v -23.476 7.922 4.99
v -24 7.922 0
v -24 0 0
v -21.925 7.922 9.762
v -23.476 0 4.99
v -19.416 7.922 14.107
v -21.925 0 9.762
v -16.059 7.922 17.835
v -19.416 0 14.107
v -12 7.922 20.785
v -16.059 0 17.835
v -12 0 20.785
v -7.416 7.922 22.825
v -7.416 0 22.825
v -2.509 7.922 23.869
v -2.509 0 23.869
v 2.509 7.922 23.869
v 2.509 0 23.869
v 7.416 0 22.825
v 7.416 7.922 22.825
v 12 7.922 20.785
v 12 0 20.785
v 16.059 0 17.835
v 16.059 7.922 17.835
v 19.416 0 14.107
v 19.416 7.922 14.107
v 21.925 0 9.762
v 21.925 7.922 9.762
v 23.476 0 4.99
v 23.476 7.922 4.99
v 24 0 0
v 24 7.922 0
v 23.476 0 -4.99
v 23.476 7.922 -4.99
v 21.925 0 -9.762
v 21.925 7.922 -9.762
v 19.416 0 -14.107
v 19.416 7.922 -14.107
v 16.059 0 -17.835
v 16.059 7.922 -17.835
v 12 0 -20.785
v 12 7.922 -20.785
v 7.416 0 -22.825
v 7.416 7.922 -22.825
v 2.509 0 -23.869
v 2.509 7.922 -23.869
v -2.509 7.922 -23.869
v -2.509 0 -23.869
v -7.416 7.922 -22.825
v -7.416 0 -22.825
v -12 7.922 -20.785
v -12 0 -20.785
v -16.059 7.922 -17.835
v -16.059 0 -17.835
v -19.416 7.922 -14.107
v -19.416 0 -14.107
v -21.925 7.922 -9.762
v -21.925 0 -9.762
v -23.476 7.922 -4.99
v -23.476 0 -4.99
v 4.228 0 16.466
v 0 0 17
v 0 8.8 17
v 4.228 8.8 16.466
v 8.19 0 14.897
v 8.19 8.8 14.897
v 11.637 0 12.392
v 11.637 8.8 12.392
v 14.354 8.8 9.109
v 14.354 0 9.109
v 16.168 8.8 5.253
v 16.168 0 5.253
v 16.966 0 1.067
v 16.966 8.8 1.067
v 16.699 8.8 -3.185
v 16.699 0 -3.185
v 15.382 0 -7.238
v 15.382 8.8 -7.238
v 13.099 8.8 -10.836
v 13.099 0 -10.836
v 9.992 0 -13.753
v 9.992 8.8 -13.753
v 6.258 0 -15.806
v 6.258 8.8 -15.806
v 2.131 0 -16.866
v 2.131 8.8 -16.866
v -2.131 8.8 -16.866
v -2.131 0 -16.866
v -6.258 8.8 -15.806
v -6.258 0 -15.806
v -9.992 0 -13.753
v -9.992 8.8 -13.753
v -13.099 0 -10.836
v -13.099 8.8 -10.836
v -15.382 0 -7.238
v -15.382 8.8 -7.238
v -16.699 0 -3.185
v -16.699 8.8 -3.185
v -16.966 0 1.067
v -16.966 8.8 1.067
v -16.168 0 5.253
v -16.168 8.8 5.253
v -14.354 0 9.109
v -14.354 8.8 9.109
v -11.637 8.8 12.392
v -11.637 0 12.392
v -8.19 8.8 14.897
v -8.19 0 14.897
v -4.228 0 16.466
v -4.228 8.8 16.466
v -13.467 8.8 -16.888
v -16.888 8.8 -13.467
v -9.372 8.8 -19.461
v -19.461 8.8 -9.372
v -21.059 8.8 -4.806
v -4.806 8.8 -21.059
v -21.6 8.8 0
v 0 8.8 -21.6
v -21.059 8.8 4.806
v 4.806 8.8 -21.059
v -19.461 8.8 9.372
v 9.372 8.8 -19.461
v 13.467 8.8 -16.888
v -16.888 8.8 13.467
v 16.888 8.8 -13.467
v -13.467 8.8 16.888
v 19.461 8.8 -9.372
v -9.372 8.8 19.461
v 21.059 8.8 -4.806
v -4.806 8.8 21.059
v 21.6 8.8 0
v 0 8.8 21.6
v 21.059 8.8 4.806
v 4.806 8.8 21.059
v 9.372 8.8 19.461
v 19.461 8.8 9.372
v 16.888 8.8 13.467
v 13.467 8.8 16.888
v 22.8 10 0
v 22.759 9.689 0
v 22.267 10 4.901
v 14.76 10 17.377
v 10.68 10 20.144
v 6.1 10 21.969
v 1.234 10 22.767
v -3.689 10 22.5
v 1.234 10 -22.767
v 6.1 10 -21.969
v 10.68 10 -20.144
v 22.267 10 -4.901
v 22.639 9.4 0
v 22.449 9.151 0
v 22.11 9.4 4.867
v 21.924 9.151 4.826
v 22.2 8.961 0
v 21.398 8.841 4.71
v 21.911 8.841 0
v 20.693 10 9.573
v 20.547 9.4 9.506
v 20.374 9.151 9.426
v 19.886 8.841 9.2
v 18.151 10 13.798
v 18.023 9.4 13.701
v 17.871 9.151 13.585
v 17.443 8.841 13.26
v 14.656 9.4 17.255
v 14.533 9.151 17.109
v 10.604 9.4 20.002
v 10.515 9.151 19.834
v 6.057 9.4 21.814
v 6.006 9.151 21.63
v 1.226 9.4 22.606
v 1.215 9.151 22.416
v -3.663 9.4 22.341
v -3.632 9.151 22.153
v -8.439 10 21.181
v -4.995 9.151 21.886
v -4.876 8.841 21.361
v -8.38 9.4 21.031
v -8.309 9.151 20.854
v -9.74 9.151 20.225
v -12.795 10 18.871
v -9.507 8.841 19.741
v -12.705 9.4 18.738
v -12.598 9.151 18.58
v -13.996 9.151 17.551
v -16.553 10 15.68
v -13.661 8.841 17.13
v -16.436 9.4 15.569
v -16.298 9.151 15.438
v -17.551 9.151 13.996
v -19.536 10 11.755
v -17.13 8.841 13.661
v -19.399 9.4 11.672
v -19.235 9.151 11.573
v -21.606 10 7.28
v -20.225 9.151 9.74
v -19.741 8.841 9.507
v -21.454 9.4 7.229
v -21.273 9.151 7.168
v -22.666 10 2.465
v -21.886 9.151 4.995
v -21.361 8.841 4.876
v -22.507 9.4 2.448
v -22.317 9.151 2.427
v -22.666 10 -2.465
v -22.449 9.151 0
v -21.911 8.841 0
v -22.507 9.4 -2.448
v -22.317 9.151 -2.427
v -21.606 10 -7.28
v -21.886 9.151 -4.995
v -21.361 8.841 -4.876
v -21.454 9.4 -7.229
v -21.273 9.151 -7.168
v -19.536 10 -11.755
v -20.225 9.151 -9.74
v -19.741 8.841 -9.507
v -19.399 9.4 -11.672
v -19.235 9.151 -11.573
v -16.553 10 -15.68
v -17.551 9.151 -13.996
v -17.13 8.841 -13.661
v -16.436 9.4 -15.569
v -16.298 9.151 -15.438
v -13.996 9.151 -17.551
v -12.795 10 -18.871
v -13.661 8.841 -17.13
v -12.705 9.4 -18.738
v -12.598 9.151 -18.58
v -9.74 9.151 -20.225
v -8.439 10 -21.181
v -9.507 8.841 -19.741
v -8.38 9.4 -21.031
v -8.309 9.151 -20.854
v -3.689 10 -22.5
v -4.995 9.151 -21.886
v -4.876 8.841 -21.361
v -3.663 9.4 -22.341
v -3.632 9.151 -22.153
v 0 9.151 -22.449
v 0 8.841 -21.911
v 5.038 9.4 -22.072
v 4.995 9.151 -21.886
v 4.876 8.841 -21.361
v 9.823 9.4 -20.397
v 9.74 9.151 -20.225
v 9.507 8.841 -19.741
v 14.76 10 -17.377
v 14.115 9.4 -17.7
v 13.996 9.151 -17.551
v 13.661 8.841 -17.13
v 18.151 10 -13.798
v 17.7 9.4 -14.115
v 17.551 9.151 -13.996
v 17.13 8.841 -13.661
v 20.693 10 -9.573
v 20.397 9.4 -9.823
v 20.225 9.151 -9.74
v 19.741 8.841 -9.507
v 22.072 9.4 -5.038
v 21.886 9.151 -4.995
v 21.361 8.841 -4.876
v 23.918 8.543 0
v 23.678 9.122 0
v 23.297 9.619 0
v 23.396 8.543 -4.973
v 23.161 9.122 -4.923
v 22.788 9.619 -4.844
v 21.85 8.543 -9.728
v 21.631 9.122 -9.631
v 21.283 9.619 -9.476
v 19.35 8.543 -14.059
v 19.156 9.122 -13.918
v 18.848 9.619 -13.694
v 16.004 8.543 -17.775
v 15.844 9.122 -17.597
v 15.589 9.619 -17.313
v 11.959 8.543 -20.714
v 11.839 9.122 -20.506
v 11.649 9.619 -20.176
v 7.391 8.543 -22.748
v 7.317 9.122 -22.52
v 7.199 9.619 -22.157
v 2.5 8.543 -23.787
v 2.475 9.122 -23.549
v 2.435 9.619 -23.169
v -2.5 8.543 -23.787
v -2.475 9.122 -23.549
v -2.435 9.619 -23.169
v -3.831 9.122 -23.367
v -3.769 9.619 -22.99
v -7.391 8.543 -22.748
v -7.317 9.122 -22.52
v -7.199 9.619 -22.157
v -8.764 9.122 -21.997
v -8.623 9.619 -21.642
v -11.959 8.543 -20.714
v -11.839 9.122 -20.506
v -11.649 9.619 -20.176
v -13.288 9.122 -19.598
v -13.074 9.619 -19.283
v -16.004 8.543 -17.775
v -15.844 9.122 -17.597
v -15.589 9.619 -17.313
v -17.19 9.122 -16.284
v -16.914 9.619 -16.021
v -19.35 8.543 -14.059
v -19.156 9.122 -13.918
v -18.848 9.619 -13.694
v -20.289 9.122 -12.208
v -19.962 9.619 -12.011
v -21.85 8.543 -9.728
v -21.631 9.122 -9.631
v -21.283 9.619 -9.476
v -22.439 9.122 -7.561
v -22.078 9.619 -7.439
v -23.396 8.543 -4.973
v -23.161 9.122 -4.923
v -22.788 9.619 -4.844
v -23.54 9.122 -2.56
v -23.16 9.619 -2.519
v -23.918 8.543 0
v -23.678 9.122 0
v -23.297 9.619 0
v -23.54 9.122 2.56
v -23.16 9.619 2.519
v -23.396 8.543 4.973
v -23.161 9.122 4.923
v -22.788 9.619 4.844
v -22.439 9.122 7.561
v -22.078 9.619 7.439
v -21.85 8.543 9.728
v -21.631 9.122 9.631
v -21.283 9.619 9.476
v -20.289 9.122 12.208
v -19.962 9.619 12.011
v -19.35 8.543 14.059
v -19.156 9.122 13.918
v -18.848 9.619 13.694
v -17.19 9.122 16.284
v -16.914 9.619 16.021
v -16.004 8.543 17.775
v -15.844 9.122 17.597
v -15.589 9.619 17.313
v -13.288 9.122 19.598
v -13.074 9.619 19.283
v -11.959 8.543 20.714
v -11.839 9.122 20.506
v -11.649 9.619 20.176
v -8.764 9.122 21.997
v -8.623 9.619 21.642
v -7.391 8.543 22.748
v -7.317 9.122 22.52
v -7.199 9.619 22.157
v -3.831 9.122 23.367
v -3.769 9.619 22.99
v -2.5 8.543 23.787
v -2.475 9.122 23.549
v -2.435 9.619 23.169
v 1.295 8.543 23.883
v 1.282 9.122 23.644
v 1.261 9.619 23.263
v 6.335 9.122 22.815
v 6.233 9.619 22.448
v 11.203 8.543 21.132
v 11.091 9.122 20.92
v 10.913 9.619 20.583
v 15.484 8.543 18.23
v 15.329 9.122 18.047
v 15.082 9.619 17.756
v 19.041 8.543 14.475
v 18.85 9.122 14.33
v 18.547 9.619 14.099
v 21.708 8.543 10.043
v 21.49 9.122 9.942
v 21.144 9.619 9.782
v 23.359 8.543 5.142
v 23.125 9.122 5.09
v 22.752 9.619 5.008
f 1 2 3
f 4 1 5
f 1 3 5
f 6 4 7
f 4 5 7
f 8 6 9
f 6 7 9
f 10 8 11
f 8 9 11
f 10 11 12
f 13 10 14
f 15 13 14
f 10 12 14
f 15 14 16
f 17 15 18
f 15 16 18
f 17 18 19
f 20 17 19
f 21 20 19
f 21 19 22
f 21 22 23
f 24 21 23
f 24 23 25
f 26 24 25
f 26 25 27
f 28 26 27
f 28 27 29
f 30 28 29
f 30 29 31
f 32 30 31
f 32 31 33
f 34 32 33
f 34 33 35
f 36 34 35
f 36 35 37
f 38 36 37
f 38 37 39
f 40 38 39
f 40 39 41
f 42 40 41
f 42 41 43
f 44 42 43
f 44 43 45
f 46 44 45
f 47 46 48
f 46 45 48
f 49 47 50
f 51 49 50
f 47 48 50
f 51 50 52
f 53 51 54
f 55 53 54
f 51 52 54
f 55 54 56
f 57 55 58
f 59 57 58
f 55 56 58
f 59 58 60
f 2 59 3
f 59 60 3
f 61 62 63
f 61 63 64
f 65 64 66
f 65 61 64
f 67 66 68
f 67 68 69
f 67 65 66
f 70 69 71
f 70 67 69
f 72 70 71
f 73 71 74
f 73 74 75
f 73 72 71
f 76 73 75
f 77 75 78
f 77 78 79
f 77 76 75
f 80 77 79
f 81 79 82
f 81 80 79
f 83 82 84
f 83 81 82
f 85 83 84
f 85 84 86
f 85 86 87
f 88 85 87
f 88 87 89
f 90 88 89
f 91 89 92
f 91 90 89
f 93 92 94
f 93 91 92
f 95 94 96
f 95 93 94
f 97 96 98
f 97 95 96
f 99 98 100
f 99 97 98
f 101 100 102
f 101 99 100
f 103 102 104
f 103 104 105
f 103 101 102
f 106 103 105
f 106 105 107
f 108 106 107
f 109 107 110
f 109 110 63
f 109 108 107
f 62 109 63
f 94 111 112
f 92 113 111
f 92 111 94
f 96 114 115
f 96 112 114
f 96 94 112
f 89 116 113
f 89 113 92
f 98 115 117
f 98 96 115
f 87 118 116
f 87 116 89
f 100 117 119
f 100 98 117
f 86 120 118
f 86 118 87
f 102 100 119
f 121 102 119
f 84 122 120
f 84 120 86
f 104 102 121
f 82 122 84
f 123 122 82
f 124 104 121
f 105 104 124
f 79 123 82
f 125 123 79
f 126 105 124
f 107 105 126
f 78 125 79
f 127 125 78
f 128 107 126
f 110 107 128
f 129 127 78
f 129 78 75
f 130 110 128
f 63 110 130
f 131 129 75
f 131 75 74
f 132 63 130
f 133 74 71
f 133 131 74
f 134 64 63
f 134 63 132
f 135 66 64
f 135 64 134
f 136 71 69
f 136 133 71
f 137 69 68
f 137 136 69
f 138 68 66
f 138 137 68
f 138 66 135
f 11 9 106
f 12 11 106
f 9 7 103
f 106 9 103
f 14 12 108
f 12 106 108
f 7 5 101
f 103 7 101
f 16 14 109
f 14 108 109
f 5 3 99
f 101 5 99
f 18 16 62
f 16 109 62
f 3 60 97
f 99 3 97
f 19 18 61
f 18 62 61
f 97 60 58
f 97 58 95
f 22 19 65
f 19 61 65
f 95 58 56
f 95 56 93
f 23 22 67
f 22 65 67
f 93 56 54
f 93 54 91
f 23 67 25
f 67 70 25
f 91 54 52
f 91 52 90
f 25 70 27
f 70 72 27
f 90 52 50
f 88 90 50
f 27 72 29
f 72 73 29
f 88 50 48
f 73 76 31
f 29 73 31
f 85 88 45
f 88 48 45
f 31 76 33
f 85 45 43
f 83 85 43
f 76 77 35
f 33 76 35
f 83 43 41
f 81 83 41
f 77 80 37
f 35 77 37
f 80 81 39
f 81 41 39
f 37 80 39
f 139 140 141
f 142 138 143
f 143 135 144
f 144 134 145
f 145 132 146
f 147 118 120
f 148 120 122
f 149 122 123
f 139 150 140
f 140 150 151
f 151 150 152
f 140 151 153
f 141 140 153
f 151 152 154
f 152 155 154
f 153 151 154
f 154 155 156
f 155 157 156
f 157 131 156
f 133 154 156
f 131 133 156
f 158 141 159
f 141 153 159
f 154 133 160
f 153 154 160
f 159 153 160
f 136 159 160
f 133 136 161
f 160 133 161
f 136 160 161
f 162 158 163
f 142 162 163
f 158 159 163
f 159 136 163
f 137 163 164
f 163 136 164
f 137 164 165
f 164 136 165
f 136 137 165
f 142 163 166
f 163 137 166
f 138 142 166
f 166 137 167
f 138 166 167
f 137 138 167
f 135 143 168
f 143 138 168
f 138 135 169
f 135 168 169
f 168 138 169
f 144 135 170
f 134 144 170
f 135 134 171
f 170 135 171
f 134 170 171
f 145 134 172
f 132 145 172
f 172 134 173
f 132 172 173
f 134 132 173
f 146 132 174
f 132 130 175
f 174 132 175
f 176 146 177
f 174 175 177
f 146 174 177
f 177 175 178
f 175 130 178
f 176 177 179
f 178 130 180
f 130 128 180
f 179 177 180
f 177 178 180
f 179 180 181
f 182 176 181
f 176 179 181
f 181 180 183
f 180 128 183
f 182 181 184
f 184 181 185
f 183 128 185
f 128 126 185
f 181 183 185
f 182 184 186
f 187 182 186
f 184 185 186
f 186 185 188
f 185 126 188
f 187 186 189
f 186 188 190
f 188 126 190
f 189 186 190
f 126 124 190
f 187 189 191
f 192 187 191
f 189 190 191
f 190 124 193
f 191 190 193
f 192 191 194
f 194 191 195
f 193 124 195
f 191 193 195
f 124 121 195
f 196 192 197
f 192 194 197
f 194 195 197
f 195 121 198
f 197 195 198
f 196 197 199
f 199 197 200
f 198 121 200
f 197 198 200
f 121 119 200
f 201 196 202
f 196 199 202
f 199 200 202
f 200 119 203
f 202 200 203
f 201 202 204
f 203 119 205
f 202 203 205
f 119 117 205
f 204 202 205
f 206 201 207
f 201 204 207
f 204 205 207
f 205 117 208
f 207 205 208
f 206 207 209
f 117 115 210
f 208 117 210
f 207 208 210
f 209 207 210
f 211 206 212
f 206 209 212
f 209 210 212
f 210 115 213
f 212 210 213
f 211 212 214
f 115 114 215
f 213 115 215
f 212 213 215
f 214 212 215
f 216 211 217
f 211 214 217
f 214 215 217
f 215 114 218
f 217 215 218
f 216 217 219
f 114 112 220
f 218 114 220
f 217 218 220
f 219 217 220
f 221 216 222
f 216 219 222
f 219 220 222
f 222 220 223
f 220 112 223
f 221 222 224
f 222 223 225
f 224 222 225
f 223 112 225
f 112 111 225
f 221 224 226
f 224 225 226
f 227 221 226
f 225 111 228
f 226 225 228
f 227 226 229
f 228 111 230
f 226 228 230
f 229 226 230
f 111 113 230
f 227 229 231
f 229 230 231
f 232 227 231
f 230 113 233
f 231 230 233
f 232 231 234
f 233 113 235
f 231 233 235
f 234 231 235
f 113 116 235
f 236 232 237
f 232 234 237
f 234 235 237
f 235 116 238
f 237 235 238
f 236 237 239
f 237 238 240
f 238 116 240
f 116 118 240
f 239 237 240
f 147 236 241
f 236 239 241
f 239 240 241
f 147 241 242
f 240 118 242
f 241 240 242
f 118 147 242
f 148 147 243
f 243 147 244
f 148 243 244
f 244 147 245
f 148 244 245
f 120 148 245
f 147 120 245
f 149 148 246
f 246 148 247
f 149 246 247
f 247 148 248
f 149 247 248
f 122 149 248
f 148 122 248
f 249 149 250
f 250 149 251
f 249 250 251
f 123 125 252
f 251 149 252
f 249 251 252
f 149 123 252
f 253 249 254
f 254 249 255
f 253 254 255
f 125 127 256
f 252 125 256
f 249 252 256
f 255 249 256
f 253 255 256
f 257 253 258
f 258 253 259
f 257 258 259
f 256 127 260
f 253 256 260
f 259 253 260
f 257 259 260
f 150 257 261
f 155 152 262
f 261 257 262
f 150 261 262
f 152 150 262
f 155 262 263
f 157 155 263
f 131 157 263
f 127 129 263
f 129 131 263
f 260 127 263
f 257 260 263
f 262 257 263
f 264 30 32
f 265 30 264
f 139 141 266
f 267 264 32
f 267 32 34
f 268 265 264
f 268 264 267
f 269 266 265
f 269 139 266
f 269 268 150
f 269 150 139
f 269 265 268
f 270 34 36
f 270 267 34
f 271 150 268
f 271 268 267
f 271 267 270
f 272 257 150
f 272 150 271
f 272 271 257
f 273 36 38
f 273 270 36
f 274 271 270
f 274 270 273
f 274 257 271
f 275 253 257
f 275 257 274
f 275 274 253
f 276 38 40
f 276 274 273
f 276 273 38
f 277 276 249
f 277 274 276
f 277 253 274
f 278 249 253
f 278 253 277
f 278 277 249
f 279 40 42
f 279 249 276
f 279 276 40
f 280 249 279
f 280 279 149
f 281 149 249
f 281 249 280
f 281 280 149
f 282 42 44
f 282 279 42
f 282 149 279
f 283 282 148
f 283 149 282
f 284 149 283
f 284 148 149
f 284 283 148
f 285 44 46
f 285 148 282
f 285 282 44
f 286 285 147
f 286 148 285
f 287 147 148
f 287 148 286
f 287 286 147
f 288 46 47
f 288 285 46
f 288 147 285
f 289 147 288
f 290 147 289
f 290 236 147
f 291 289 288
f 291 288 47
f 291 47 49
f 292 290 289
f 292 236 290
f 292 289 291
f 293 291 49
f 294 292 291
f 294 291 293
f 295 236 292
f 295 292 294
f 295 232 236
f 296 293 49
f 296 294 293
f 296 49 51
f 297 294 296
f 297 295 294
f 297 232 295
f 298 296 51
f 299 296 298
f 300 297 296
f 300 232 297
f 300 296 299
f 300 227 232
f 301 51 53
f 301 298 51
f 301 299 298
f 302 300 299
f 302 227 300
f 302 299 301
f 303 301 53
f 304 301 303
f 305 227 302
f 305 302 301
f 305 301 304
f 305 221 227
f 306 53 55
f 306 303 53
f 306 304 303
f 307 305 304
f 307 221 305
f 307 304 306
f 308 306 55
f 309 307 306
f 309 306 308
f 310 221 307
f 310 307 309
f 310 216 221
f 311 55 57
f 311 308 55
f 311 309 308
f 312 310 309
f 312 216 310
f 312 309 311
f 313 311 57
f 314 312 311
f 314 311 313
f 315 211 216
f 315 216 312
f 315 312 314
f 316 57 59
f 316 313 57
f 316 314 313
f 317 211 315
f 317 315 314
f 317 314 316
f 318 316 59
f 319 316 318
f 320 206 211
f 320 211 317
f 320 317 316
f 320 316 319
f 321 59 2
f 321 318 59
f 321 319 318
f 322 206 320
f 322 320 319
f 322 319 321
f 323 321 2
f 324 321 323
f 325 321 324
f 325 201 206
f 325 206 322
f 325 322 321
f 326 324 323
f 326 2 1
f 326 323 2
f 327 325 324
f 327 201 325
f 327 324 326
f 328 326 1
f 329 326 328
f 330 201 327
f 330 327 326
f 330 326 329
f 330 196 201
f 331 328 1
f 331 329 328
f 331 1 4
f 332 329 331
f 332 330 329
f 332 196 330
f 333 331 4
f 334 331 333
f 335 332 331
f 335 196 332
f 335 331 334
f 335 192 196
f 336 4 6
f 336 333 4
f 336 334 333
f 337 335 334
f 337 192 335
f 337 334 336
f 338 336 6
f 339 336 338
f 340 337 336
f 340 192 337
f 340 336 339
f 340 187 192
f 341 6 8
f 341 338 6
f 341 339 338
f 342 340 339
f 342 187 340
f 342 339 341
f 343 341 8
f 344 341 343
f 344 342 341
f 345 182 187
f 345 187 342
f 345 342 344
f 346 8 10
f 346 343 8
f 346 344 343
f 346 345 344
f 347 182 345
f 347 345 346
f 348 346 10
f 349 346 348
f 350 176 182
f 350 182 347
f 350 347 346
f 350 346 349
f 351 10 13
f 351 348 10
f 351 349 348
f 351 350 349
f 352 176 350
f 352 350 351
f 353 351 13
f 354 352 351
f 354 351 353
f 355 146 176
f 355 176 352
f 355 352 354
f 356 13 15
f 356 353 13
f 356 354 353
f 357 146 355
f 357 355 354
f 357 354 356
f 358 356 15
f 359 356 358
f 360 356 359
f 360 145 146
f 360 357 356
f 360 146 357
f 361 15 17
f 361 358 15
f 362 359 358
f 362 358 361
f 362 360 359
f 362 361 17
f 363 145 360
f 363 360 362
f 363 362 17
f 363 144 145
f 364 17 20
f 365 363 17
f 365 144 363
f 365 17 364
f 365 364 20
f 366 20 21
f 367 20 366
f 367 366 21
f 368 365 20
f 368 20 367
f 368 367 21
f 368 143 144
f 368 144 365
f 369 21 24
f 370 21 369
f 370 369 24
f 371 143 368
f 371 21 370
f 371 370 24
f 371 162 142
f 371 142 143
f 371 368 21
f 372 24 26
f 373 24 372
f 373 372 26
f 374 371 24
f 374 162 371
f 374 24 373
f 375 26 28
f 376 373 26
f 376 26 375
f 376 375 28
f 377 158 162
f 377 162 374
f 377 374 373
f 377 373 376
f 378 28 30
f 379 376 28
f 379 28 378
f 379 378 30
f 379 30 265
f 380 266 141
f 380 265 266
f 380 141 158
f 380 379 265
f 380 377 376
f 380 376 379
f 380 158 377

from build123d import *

# Parameters (mm, degrees)
SKETCH1_R           = 22.8
SKETCH1_R_2         = 17
BOSS_EXTRUDE4_DEPTH = 8.8
BOSS_EXTRUDE6_DEPTH = 10
FILLET1_R           = 1.2
FILLET2_R           = 2.4


# Some blends are built 0.0001 mm under size
with BuildPart() as part:
    # Sketch1 → Boss-Extrude4 (new body)
    with BuildSketch(Plane(origin=(0, 0, 0), x_dir=(1, 0, 0), z_dir=(0, 1, 0))):
        with Locations(Location((0, 0, 0), (0, 0, 270))):
            Circle(SKETCH1_R)
        with Locations(Location((0, 0, 0), (0, 0, 270))):
            Circle(SKETCH1_R_2, mode=Mode.SUBTRACT)
    extrude(amount=BOSS_EXTRUDE4_DEPTH)

    # Sketch1<7> → Boss-Extrude6 (add)
    with BuildSketch(Plane(origin=(0, 0, 0), x_dir=(1, 0, 0), z_dir=(0, 1, 0))):
        with BuildLine():
            ThreePointArc((24, 0), (0, 24), (-24, 0))
            Line((-24, 0), (-22.8, 0))
            ThreePointArc((-22.8, 0), (0, 22.8), (22.8, 0))
            Line((22.8, 0), (24, 0))
        make_face()
        with BuildLine():
            Line((-22.8, 0), (-24, 0))
            ThreePointArc((-24, 0), (0, -24), (24, 0))
            Line((24, 0), (22.8, 0))
            ThreePointArc((22.8, 0), (0, -22.8), (-22.8, 0))
        make_face()
    extrude(amount=BOSS_EXTRUDE6_DEPTH)

    # Fillet1
    fillet1_edges = [part.edges().sort_by_distance(p)[0] for p in [
        (-22.8, 8.8, 0),
    ]]
    fillet(fillet1_edges, radius=FILLET1_R - 0.0001)  # a hair under: the kernel refuses the full size

    # Fillet2
    # the kernel refuses this fillet: 2.4 mm, written as the material it takes off along each edge
    with BuildSketch(Plane(origin=(0, 10, 0), x_dir=(1, 0, 0), z_dir=(0, 0, 1))) as fillet2_piece_1:
        with BuildLine():
            CenterArc((21.6, -2.078460969), FILLET2_R, 0, 60)
            Line((24, -2.078460969), (24.048, -2.078460969))
            Line((24.048, -2.078460969), (24.048, 0))
            Line((24.048, 0), (24, 0.048))
            ThreePointArc((24, 0.048), (23.4, 0.048), (22.824, 0.041569219))
            Line((22.824, 0.041569219), (22.8, 0))
        make_face()
    revolve(axis=Axis((0, 10, 0), (0, 1, 0)), mode=Mode.SUBTRACT)


solid = part.part
